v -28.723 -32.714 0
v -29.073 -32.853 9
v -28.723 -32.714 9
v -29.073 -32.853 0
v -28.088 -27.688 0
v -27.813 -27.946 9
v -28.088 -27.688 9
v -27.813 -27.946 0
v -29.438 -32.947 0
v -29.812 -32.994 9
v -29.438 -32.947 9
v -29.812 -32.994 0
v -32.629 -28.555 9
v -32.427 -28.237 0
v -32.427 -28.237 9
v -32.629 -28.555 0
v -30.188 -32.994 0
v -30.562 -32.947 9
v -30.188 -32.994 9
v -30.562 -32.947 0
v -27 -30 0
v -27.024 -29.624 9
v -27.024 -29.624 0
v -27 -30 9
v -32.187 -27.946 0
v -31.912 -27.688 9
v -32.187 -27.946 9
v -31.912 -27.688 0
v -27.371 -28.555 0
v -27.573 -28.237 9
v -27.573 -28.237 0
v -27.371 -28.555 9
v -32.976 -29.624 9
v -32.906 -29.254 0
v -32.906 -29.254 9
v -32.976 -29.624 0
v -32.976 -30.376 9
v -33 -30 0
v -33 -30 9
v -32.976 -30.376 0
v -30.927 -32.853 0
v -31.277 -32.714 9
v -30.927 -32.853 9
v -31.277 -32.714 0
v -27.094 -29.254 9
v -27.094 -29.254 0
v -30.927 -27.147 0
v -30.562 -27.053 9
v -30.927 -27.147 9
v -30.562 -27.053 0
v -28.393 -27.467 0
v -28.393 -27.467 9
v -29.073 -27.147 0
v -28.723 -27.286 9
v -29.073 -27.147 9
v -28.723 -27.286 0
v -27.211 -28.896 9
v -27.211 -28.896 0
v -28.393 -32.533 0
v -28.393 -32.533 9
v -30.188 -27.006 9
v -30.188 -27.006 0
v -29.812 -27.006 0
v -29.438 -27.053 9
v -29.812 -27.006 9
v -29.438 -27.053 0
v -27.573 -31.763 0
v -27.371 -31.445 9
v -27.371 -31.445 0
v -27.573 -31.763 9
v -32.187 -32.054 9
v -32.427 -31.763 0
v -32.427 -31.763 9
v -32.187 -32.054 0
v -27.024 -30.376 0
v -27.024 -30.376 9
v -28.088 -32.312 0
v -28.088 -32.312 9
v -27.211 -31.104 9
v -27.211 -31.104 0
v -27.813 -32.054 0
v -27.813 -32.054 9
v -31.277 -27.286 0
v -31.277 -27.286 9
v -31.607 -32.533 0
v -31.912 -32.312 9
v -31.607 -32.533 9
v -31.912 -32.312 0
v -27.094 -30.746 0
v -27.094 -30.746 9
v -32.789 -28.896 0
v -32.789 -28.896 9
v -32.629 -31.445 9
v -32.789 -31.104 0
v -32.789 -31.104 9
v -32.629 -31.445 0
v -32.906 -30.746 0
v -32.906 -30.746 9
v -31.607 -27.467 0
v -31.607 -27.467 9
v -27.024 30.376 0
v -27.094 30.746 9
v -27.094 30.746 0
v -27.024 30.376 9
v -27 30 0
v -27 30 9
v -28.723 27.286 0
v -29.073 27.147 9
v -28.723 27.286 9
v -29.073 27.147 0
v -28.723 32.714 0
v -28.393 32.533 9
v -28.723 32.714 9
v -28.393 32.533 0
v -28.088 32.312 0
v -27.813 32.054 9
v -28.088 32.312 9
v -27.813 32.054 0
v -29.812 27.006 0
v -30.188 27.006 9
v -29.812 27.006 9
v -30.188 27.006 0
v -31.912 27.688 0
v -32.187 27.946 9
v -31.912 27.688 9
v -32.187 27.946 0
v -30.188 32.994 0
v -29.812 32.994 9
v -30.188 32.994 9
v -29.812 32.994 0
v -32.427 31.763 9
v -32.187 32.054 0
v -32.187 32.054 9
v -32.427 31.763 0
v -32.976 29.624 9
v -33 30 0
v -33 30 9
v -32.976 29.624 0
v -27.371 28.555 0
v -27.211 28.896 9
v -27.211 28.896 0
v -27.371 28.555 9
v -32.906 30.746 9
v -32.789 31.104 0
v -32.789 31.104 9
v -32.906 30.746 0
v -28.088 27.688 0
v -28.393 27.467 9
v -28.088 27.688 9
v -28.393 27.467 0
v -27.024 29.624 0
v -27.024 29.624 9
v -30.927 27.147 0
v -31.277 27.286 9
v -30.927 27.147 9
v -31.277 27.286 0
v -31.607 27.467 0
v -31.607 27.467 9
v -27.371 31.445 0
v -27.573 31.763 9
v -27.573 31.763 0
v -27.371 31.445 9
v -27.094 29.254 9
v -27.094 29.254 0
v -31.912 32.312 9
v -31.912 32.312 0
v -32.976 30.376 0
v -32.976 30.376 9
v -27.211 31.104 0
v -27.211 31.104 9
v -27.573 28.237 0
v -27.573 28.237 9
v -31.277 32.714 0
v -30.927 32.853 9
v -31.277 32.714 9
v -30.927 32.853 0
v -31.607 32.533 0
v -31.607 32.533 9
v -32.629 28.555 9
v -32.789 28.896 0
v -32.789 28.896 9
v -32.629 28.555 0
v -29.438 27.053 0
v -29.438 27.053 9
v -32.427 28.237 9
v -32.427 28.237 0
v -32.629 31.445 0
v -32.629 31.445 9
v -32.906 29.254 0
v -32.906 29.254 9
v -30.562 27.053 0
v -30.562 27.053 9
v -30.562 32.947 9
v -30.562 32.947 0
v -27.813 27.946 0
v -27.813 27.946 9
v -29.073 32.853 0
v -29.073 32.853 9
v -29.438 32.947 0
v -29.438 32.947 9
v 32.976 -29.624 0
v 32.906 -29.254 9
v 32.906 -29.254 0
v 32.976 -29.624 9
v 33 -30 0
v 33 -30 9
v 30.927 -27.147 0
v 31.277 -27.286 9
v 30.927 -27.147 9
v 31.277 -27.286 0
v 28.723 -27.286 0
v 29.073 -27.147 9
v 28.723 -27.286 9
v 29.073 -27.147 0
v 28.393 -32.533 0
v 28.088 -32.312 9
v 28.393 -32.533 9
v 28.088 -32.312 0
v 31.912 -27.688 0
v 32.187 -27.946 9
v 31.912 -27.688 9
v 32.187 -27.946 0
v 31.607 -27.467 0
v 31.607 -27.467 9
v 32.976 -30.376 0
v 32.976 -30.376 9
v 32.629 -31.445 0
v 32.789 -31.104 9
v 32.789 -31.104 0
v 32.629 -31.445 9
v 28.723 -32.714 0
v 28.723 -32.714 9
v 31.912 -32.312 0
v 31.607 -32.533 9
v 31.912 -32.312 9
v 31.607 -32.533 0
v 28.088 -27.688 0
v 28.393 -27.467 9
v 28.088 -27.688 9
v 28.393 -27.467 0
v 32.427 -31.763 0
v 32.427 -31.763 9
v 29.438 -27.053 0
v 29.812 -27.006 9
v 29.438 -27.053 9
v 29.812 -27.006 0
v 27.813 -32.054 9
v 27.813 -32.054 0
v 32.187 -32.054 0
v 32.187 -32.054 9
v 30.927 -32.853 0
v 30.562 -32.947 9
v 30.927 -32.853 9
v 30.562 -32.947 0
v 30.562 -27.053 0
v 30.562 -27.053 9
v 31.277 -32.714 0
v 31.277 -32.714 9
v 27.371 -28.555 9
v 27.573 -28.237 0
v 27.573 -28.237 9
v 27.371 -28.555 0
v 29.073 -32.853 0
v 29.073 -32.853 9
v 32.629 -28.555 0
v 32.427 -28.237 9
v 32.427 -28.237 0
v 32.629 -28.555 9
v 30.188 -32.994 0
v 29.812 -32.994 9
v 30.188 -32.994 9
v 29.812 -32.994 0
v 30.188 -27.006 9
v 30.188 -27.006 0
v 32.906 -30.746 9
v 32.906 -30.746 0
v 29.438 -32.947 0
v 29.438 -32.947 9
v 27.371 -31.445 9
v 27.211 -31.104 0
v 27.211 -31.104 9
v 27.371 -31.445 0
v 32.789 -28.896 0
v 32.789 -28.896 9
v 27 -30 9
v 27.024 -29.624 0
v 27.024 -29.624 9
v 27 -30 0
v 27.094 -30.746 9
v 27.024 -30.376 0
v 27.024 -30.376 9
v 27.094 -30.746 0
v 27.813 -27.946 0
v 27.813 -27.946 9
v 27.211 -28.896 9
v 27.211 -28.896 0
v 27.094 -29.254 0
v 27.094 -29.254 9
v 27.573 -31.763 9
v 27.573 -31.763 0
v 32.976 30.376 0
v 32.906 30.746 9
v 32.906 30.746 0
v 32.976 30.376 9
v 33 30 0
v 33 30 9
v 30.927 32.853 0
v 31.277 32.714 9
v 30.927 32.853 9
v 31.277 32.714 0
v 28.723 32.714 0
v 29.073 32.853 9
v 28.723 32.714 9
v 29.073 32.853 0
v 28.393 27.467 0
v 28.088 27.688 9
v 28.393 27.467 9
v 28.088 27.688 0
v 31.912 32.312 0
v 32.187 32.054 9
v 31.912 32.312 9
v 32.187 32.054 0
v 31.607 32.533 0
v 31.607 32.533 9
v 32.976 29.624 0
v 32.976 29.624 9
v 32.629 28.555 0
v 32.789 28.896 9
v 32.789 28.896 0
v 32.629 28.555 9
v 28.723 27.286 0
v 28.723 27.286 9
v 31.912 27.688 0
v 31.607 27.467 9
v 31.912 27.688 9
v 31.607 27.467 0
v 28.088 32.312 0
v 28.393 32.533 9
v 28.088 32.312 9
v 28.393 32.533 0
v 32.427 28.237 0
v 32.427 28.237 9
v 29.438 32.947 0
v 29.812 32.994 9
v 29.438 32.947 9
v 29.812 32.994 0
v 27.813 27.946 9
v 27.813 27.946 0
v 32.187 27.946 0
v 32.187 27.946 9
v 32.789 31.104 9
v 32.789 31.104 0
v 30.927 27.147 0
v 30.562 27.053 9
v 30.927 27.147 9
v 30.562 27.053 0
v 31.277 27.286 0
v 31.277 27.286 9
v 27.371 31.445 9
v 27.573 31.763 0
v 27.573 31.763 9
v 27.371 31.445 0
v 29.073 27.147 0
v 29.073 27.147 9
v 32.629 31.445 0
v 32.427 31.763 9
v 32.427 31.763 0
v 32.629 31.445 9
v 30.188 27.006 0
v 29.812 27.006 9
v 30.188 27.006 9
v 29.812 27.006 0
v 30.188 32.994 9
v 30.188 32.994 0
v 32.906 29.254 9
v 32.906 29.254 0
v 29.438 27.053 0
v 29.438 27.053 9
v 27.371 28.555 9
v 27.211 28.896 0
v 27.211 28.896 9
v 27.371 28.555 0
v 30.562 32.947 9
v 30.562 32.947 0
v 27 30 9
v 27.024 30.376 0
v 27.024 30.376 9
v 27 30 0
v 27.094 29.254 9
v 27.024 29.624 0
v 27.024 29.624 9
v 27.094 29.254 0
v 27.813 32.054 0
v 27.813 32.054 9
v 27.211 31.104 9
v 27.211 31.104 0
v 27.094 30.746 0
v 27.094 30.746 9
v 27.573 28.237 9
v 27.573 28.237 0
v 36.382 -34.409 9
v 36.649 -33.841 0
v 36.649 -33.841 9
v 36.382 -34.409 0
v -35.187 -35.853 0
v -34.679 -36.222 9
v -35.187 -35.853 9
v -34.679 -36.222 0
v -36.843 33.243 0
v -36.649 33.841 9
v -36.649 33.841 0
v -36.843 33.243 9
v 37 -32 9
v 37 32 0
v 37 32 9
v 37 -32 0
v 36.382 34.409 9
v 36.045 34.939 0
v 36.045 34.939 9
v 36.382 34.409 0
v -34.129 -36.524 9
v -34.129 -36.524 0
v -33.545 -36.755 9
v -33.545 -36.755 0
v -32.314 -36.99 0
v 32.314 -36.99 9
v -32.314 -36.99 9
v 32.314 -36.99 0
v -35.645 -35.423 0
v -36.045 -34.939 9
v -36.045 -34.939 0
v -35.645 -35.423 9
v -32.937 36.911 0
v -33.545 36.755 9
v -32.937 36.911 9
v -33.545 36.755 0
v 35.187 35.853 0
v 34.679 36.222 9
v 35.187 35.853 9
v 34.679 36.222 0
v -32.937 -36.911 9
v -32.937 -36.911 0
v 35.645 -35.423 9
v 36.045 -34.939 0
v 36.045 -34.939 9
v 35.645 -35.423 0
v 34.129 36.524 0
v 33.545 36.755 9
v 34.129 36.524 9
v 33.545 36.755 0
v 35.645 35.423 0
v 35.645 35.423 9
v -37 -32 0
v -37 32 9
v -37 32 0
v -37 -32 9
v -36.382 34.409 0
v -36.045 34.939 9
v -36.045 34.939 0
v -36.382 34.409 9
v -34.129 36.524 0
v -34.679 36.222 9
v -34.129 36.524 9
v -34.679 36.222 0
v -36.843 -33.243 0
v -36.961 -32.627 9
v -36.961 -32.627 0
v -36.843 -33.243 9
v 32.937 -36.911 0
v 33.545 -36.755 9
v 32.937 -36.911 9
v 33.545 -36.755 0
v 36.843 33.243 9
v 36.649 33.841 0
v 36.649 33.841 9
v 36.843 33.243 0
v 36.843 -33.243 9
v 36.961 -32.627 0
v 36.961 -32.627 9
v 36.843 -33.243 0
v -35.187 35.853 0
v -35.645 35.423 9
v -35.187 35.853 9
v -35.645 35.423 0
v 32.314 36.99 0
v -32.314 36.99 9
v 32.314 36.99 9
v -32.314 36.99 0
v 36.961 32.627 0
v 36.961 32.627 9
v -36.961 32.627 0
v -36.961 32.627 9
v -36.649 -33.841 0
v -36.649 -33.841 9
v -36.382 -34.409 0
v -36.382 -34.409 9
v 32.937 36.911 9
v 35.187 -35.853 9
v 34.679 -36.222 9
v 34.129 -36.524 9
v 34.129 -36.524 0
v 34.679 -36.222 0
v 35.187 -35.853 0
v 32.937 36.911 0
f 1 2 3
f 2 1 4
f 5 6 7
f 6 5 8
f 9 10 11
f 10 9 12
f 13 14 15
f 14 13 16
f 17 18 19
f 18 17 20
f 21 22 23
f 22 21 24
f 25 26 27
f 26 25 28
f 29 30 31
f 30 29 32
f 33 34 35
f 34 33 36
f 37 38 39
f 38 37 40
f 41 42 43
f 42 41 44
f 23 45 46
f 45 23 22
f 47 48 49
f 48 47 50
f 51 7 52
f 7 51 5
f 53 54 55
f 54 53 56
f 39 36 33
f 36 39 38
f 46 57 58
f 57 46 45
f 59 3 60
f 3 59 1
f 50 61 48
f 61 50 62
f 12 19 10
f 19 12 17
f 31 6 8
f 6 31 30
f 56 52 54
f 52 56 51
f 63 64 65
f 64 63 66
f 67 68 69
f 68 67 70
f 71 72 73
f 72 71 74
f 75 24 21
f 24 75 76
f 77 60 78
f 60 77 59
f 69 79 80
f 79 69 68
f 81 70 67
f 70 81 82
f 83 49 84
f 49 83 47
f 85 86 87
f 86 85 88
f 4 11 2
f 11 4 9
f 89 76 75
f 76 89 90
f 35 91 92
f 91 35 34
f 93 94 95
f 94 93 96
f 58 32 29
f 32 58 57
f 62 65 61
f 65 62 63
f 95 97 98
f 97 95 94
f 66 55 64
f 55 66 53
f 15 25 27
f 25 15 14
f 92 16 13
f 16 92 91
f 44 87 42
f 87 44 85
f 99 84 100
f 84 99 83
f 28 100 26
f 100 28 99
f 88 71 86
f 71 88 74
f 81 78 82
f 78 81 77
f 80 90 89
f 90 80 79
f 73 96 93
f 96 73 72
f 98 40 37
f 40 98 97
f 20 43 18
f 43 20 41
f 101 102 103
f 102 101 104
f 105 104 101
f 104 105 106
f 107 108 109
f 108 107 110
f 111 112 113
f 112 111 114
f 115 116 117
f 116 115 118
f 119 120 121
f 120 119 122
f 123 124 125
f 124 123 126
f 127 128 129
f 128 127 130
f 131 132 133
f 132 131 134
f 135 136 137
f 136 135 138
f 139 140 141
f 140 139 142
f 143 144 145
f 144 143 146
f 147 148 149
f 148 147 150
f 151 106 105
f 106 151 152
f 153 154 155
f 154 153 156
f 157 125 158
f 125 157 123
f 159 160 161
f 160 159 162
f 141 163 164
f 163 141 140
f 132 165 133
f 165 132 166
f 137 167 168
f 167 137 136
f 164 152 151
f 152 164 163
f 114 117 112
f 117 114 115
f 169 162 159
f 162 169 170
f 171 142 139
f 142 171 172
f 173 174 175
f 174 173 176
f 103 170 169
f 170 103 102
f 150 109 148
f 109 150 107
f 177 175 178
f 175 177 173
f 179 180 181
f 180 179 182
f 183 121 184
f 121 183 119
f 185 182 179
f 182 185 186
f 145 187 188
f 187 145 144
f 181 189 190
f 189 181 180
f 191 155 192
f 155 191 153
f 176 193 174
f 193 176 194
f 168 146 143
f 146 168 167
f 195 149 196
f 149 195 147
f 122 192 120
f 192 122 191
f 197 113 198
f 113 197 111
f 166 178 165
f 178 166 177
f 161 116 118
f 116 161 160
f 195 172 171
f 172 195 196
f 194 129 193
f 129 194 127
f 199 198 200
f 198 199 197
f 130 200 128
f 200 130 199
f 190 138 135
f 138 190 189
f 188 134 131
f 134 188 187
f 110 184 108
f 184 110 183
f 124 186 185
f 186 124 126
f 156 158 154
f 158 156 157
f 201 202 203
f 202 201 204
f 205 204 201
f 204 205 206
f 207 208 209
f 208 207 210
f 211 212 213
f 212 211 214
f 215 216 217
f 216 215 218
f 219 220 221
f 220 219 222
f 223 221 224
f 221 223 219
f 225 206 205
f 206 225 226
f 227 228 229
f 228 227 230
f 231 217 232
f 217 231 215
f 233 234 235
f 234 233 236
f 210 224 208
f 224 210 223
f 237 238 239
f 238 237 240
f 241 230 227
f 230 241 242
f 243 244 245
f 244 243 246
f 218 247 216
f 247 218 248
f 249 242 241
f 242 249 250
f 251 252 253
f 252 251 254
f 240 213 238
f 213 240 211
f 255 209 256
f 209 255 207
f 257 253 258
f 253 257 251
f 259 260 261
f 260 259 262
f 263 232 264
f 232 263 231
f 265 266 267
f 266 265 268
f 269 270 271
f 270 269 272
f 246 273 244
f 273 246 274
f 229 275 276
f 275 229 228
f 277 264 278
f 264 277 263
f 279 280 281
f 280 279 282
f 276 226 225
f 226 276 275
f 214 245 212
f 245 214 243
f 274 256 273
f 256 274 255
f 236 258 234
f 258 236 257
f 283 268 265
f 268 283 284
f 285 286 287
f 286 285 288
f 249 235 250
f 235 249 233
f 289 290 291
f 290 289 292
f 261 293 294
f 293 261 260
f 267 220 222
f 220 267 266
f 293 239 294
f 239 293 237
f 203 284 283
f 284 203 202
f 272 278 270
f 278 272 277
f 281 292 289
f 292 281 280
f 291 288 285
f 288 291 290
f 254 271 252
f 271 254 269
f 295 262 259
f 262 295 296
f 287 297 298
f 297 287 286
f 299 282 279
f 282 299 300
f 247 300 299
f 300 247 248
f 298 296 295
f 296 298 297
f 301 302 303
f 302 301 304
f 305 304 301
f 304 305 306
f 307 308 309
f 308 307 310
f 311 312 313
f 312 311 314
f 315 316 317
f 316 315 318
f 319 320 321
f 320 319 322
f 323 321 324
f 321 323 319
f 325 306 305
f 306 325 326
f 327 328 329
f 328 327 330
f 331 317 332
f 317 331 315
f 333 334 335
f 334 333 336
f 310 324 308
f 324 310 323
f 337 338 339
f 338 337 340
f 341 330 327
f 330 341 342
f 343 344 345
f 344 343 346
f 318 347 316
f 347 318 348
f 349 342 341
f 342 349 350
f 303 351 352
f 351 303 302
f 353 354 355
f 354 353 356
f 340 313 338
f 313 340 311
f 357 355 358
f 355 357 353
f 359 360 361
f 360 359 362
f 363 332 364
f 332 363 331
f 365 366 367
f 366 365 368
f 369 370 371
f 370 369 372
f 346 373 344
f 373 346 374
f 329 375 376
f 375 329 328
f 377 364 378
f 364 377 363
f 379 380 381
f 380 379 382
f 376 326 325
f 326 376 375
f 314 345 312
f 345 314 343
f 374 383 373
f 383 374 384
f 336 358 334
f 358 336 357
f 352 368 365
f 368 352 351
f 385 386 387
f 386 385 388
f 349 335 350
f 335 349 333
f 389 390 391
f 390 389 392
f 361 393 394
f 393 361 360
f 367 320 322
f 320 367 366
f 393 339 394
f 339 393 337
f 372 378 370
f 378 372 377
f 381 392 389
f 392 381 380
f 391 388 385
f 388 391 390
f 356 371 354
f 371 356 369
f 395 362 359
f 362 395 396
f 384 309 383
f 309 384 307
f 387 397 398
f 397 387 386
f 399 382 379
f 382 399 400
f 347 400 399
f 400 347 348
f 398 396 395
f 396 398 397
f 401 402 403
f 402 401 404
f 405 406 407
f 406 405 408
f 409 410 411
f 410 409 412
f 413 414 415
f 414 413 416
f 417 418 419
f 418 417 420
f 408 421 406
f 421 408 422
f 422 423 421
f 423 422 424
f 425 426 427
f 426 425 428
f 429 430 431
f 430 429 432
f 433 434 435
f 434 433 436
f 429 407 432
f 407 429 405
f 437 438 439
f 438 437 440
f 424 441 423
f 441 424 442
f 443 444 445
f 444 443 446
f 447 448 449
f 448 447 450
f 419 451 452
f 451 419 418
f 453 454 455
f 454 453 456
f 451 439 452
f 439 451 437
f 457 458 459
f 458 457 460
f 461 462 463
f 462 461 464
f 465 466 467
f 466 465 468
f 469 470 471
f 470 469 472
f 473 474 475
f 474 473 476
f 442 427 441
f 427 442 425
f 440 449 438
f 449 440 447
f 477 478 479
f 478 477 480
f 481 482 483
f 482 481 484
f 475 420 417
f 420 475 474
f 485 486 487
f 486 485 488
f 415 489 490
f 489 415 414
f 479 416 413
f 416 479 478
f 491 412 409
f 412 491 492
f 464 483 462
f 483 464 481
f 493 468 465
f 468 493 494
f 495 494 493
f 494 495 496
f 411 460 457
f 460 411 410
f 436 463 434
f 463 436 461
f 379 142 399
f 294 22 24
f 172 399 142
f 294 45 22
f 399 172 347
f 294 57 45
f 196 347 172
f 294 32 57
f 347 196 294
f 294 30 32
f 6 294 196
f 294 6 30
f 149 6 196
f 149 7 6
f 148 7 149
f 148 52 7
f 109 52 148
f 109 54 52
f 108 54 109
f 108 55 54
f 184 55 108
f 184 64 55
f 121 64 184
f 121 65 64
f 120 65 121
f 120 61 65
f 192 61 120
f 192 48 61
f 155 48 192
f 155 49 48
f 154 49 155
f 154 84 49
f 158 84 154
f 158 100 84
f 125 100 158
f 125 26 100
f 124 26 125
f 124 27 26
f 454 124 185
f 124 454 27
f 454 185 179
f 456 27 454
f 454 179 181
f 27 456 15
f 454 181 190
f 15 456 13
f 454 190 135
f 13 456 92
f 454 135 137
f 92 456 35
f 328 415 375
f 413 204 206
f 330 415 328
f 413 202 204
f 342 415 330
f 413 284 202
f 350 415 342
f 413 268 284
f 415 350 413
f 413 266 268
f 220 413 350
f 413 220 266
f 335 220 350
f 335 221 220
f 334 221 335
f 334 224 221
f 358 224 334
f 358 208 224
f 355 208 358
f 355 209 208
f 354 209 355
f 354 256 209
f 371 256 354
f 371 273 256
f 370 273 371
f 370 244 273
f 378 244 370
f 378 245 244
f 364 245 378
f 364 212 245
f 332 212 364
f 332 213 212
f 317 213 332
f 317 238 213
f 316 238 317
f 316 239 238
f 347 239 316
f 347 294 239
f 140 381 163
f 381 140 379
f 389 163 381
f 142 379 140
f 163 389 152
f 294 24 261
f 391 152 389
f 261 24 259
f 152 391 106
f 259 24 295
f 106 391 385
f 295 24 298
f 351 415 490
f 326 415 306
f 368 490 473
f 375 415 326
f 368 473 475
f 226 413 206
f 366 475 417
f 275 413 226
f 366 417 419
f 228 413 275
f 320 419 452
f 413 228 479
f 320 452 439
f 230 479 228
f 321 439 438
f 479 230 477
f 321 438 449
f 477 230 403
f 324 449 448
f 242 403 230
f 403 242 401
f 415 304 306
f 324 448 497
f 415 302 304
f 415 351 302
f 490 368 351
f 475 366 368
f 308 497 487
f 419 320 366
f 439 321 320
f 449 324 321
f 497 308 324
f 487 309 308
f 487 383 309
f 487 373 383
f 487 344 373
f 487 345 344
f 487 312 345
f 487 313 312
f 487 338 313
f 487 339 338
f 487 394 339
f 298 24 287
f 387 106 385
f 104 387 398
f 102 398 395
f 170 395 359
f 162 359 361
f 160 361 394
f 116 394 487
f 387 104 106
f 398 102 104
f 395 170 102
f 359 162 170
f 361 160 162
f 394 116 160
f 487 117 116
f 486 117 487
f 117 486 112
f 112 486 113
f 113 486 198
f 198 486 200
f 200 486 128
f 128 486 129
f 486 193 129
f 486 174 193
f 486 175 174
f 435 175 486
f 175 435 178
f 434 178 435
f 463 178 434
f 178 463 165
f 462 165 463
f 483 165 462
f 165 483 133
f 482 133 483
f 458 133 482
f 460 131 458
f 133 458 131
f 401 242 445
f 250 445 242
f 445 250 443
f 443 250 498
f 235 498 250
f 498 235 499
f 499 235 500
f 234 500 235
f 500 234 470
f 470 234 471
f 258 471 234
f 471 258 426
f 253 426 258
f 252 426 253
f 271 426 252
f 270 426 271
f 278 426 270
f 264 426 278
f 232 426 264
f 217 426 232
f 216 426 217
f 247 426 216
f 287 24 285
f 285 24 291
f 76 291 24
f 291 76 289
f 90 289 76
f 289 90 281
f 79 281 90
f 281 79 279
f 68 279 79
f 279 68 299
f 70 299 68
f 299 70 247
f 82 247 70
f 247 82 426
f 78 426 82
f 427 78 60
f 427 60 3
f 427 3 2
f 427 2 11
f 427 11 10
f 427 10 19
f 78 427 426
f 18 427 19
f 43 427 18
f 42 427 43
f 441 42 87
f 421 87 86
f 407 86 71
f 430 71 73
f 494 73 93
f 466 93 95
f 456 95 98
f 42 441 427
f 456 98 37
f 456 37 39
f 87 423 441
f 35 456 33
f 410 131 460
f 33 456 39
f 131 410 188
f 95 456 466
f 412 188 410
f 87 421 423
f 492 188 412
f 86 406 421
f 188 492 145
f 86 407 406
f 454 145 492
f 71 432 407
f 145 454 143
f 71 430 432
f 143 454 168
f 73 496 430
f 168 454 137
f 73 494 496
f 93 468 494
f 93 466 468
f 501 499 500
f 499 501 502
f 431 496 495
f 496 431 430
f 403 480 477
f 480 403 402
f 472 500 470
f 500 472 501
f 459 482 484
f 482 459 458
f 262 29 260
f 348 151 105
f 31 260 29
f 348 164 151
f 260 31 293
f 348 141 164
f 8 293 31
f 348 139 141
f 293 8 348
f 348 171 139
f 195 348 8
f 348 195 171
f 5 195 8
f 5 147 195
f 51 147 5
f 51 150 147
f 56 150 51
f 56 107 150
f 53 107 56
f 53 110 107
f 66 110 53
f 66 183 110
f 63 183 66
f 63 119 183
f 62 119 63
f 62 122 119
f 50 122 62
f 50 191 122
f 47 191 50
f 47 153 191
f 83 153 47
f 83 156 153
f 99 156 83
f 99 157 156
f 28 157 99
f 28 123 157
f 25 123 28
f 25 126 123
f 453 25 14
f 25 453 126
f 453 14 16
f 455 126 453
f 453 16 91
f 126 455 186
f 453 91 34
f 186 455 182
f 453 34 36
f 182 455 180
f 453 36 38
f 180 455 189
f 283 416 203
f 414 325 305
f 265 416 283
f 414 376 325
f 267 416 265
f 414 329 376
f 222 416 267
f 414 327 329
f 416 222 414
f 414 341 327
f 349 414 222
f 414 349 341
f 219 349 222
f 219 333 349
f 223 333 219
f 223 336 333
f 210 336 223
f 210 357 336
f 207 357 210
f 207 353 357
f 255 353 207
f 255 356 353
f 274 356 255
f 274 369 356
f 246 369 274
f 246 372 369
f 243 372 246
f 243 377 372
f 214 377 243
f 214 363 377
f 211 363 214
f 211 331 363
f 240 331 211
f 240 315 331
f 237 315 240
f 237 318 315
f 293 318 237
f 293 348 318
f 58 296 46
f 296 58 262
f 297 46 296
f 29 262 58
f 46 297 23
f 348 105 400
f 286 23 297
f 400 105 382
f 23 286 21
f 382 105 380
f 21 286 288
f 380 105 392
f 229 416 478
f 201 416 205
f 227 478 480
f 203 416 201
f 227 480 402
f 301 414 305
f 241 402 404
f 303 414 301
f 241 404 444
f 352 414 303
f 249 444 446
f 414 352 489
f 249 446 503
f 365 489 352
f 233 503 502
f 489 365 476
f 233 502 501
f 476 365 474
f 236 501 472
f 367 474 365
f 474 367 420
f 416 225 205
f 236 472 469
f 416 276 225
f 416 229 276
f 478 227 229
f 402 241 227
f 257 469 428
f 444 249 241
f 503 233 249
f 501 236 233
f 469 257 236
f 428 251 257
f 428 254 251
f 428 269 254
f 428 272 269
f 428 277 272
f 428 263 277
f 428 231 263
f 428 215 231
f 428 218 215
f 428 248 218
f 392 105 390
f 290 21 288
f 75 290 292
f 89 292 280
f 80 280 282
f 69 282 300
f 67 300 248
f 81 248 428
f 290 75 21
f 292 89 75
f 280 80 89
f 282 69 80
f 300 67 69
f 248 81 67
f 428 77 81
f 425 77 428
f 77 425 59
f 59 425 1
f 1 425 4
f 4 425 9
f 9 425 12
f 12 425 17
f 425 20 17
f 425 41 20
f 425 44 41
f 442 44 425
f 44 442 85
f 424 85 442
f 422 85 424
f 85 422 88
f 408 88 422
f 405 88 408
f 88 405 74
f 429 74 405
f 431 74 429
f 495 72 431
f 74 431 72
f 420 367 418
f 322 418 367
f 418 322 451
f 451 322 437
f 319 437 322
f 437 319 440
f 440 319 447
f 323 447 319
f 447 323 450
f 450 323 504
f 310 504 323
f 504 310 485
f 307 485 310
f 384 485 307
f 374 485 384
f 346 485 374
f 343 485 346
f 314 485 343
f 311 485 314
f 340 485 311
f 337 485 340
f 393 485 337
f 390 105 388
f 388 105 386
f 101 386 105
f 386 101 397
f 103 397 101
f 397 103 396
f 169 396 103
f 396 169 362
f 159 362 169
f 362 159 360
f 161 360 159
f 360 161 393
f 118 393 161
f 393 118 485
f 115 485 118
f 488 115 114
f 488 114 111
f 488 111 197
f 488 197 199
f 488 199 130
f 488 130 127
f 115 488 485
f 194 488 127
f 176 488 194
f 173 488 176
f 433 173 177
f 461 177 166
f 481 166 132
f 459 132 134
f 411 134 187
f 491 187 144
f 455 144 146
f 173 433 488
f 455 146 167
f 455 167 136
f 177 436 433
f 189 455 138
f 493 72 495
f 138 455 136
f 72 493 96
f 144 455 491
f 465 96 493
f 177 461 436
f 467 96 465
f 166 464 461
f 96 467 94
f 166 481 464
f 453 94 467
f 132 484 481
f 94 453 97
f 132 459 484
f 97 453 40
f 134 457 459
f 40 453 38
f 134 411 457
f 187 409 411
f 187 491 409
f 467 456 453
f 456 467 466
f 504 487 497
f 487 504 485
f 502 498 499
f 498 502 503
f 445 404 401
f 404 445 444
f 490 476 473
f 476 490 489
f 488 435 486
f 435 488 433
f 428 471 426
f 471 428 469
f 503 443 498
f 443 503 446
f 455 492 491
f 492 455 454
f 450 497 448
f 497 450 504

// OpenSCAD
$fn = 50;


difference() {
	union() {
		hull() {
			translate(v = [-32.0000000000, 32.0000000000, 0]) {
				cylinder(h = 9, r = 5);
			}
			translate(v = [32.0000000000, 32.0000000000, 0]) {
				cylinder(h = 9, r = 5);
			}
			translate(v = [-32.0000000000, -32.0000000000, 0]) {
				cylinder(h = 9, r = 5);
			}
			translate(v = [32.0000000000, -32.0000000000, 0]) {
				cylinder(h = 9, r = 5);
			}
		}
	}
	union() {
		translate(v = [-30.0000000000, -30.0000000000, -100.0000000000]) {
			cylinder(h = 200, r = 3.0000000000);
		}
		translate(v = [-30.0000000000, 30.0000000000, -100.0000000000]) {
			cylinder(h = 200, r = 3.0000000000);
		}
		translate(v = [30.0000000000, -30.0000000000, -100.0000000000]) {
			cylinder(h = 200, r = 3.0000000000);
		}
		translate(v = [30.0000000000, 30.0000000000, -100.0000000000]) {
			cylinder(h = 200, r = 3.0000000000);
		}
	}
}
